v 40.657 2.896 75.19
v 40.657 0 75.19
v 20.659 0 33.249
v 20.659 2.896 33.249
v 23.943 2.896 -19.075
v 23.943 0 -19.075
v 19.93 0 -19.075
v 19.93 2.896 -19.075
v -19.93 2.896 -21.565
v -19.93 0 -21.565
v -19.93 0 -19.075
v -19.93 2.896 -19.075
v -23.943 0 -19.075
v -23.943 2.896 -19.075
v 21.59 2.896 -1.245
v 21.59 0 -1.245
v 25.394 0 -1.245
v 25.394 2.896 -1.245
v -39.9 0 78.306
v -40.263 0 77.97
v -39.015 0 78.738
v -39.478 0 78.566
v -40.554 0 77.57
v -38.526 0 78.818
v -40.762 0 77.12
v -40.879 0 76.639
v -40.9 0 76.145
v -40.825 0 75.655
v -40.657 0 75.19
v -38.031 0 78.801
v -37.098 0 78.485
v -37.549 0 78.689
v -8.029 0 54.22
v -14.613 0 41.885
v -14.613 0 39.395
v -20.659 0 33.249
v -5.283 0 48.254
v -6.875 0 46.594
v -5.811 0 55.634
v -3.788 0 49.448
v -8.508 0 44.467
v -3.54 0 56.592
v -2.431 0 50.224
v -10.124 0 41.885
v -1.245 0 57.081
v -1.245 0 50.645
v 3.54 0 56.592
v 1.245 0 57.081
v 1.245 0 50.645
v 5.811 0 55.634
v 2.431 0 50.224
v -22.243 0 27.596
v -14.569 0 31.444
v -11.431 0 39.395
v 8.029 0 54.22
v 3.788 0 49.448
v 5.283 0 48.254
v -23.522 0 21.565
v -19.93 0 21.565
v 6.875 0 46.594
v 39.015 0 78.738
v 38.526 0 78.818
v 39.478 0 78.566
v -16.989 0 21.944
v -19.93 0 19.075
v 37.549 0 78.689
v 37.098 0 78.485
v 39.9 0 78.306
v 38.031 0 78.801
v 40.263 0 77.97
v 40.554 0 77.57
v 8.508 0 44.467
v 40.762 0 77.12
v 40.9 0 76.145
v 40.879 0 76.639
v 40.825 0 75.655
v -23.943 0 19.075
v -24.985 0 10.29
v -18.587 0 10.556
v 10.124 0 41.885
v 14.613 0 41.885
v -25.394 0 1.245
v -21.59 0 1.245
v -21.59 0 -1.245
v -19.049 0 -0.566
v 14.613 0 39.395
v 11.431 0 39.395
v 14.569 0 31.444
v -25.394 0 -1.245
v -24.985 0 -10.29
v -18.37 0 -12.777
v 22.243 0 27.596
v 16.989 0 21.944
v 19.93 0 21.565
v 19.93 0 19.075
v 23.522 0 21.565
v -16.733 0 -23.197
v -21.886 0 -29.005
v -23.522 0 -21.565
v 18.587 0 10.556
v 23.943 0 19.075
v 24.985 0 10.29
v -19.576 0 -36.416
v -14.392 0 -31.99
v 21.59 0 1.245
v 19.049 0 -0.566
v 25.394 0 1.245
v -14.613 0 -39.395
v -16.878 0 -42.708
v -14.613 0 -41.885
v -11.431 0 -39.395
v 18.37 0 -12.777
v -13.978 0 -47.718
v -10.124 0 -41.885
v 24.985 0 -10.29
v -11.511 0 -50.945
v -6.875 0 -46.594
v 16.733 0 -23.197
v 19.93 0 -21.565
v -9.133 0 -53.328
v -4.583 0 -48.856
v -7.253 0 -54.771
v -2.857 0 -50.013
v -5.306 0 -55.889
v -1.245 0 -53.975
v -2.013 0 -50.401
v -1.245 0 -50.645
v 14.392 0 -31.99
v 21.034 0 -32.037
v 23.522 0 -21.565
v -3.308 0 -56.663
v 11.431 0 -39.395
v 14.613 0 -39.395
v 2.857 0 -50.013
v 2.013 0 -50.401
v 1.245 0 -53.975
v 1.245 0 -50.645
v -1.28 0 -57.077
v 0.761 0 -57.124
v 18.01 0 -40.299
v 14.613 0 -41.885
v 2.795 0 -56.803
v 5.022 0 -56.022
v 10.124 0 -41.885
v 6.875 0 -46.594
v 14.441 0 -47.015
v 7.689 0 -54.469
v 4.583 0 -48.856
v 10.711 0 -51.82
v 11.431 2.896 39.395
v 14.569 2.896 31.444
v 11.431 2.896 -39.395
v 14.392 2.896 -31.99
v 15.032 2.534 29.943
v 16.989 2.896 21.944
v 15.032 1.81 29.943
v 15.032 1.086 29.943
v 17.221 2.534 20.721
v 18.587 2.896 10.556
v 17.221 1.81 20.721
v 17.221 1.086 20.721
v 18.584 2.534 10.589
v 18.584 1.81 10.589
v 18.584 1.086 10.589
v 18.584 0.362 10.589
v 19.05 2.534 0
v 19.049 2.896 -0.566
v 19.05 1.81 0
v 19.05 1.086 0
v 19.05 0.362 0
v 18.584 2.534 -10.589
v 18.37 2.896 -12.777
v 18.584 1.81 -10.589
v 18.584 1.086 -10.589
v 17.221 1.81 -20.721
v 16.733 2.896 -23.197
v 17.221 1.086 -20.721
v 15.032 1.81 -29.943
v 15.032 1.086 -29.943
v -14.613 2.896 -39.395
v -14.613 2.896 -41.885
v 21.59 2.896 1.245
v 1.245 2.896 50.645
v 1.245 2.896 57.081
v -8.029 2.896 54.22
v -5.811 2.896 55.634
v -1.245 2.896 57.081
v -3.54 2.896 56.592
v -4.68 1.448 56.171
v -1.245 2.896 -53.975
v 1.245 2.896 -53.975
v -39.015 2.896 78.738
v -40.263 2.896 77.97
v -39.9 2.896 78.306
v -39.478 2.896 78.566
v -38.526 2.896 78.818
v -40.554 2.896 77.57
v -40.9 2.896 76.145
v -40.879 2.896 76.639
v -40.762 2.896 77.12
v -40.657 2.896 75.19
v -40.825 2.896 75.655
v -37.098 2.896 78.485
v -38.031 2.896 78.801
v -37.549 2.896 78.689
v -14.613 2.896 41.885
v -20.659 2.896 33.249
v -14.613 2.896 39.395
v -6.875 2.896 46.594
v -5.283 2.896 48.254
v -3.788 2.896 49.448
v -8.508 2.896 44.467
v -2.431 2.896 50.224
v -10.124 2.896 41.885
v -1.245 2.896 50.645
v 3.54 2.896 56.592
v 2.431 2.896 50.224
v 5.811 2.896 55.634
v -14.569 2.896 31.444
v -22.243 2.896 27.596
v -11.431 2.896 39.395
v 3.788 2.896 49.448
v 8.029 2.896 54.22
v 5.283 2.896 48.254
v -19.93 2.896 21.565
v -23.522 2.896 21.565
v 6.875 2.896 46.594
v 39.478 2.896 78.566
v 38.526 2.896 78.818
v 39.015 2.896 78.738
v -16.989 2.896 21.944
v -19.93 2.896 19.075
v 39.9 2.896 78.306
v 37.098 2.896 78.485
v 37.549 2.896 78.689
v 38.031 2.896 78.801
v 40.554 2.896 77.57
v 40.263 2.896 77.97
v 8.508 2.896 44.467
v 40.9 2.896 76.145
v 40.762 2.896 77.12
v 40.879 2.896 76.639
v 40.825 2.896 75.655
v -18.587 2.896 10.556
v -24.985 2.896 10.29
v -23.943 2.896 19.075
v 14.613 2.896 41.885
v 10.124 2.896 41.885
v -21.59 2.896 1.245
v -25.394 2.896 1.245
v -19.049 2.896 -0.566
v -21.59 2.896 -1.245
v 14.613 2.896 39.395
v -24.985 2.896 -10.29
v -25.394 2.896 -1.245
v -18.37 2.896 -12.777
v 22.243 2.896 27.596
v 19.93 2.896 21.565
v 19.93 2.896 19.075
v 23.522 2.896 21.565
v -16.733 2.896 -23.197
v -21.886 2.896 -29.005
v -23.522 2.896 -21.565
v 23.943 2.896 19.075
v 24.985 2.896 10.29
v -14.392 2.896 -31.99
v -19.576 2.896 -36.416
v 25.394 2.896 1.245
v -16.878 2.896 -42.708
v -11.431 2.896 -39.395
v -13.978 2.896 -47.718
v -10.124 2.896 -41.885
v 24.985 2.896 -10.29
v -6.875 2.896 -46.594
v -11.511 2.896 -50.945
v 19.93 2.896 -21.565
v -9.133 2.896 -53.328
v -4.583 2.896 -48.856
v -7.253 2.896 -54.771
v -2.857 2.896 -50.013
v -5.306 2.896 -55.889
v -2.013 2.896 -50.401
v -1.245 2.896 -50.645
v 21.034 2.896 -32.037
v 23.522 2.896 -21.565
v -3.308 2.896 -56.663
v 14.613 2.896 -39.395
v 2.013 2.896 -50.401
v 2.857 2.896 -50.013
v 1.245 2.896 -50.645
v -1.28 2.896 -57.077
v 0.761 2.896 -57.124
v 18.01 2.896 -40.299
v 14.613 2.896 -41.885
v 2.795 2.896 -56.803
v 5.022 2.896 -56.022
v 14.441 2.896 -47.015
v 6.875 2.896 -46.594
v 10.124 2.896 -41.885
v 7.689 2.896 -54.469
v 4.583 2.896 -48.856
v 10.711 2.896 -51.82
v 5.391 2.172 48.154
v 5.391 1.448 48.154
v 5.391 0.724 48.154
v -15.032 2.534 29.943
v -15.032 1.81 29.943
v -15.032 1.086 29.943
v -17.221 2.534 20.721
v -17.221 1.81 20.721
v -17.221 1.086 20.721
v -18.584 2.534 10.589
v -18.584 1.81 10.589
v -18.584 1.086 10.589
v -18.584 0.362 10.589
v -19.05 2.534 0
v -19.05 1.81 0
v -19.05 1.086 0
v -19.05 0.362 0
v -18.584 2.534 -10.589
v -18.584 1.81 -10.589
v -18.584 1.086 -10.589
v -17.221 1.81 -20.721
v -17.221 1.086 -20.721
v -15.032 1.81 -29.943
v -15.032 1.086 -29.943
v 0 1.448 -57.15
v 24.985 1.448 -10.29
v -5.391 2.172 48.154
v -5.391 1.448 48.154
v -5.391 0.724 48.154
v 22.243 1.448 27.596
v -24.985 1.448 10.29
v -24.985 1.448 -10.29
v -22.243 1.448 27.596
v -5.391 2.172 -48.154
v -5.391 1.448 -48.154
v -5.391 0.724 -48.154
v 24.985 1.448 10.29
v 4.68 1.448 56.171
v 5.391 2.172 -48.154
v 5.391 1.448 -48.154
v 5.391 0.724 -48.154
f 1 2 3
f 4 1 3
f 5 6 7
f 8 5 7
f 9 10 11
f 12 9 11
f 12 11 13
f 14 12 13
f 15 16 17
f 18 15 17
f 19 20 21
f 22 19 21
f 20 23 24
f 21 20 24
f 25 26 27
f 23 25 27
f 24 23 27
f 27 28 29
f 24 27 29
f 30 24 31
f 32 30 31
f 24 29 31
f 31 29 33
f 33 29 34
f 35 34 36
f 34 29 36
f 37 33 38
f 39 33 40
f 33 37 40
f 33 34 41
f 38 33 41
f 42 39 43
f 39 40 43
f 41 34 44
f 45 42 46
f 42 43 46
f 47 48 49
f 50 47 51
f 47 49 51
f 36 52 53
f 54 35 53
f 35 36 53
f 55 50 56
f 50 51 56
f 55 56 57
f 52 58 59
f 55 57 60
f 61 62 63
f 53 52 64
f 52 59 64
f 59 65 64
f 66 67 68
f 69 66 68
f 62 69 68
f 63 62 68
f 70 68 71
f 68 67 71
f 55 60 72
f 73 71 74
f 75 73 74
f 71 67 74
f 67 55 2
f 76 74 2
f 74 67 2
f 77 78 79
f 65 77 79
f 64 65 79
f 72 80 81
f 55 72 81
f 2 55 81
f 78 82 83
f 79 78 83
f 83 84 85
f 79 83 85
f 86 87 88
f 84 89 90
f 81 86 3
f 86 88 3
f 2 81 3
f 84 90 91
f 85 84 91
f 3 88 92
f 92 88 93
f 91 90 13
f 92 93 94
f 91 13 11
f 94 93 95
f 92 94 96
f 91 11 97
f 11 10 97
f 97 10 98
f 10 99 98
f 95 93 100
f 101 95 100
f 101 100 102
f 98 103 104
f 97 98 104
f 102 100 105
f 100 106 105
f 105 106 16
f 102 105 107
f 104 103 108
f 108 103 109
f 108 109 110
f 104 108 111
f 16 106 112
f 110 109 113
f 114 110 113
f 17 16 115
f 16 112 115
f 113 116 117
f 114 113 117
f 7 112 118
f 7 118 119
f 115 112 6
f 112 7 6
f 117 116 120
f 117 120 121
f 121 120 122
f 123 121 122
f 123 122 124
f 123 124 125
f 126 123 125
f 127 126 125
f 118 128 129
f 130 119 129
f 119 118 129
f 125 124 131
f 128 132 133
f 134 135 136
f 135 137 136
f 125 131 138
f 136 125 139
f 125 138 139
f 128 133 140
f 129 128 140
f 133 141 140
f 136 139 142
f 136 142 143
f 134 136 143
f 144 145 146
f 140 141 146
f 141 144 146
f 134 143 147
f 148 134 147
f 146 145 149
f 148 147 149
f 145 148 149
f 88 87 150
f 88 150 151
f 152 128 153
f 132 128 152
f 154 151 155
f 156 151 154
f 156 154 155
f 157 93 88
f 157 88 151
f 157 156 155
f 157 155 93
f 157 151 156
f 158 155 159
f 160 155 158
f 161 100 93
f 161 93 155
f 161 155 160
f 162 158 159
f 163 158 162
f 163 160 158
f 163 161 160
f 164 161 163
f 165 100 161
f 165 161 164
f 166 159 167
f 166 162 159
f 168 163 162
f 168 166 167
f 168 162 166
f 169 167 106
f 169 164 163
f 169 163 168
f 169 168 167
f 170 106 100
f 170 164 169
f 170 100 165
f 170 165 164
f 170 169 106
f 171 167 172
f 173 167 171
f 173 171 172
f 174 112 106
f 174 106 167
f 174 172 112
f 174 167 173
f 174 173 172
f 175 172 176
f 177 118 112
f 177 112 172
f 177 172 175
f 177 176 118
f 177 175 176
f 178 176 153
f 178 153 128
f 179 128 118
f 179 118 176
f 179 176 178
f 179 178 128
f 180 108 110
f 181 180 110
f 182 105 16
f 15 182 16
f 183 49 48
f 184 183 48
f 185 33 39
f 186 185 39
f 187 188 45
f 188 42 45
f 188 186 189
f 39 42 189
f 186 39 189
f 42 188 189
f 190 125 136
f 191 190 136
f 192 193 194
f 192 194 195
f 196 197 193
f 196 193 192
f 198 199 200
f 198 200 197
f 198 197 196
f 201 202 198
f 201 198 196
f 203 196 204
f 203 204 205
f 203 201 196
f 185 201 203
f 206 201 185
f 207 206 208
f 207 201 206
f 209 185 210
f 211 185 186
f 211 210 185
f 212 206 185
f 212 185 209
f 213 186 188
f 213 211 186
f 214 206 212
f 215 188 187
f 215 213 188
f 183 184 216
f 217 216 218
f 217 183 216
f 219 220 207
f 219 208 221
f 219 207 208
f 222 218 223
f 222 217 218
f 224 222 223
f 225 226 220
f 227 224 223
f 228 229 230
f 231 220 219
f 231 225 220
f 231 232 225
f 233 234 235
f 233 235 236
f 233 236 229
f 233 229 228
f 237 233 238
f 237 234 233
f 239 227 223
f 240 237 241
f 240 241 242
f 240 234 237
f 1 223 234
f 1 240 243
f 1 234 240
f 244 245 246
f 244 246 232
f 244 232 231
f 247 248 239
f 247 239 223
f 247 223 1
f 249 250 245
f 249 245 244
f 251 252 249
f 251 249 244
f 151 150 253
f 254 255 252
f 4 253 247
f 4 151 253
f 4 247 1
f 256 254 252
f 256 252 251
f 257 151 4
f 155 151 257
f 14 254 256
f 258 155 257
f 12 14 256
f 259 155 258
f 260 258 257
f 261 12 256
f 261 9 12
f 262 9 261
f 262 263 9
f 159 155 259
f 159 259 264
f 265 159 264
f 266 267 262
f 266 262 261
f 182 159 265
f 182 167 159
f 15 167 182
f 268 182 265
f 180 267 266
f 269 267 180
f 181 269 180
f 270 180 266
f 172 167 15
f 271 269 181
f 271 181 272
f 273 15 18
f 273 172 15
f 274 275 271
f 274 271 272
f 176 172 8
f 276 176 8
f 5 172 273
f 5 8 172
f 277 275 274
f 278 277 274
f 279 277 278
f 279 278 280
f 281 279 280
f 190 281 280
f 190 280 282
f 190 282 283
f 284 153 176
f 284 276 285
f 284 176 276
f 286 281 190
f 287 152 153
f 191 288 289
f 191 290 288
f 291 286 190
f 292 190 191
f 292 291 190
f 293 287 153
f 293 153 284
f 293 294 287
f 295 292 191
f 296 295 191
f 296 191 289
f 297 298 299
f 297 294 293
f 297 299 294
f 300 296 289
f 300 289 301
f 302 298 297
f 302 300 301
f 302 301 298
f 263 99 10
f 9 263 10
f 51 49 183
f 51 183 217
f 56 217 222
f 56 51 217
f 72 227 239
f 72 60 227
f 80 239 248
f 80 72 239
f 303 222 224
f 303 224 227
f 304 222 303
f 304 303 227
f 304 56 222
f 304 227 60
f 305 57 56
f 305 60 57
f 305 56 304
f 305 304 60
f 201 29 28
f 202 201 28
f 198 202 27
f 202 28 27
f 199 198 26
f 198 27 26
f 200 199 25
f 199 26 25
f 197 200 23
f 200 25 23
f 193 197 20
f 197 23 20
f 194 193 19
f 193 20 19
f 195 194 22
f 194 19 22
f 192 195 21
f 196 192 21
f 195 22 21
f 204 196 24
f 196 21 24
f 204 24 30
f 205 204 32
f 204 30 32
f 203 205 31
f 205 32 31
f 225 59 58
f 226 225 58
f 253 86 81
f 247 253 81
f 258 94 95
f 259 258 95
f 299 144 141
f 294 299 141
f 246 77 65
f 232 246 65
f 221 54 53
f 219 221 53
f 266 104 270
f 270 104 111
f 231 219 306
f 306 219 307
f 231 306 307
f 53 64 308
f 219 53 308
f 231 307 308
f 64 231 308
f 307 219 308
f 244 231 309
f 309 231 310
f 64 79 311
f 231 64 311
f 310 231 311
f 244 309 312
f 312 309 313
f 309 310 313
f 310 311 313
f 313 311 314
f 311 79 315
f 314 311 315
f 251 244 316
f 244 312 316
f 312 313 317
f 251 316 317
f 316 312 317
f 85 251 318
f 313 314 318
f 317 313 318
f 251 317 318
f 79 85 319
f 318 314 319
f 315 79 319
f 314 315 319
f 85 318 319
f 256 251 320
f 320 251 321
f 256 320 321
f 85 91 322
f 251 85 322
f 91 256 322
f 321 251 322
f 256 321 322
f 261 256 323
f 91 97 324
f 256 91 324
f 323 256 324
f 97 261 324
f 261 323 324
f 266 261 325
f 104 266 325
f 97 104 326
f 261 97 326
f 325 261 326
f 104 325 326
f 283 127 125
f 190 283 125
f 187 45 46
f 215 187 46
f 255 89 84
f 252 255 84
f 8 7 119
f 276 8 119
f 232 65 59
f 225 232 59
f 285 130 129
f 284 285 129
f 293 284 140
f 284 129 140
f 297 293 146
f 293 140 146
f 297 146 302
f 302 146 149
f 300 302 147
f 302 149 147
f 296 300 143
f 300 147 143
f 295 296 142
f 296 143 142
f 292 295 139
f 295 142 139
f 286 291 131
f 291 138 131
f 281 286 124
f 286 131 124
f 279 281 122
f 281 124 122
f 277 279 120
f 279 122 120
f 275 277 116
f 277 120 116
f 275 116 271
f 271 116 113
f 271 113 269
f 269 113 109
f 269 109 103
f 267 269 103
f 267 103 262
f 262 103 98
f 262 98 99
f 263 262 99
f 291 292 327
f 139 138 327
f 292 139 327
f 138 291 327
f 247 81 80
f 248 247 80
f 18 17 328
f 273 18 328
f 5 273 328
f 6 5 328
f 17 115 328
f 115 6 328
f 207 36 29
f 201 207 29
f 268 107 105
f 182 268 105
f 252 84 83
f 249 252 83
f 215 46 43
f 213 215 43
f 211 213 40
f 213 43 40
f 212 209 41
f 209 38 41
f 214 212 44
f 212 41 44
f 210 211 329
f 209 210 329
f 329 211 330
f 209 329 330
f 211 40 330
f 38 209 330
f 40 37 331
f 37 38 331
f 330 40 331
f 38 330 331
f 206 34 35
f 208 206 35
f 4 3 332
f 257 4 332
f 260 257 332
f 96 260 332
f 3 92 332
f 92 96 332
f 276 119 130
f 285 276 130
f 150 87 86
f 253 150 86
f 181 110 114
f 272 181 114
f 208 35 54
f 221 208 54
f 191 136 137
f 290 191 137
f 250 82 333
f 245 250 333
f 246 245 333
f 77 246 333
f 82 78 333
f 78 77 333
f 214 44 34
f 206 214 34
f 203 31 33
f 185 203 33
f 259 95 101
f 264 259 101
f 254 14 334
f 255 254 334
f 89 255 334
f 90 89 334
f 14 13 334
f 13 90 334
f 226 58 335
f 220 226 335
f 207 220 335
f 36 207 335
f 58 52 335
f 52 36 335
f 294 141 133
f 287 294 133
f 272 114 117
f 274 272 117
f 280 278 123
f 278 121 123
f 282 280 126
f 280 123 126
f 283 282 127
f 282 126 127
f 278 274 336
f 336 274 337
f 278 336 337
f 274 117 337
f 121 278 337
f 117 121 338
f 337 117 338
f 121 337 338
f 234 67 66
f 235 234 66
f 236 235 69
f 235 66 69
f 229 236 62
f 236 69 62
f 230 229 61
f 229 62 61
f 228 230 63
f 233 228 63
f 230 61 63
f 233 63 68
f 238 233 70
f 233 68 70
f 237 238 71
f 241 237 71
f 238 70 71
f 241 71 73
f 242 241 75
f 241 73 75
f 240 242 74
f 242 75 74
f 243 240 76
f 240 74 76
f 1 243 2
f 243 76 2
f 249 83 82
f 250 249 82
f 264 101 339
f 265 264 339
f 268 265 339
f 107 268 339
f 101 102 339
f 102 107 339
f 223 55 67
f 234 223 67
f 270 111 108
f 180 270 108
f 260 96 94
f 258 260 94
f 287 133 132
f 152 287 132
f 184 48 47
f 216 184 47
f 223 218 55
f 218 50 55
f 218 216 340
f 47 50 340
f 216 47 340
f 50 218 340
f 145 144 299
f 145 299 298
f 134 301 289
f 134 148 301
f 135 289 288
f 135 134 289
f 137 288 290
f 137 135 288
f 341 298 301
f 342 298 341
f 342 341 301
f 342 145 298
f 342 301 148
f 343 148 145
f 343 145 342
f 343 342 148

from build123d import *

# Parameters (mm, degrees)
BOSS_EXTRUDE1_DEPTH = 2.8956


with BuildPart() as part:
    # Sketch1 → Boss-Extrude1 (new body)
    with BuildSketch(Plane(origin=(0, 0, 0), x_dir=(1, 0, 0), z_dir=(0, 1, 0))):
        with BuildLine():
            Line((21.59, 1.2446), (25.393976036, 1.2446))
            add(Edge.make_bspline(
                [(25.393976036, 1.2446), (25.305125525, 10.422131382), (23.943355437, 19.0754)],
                knots=[4.73416848, 4.73416848, 4.73416848, 5.052697334, 5.052697334, 5.052697334], degree=2, weights=[1, 0.987344206, 1]))
            Line((23.943355437, 19.0754), (19.930240776, 19.0754))
            Line((19.930240776, 19.0754), (19.930240776, 21.5646))
            Line((19.930240776, 21.5646), (23.522368768, 21.5646))
            add(Edge.make_bspline(
                [(23.522368768, 21.5646), (0, 151.457597173), (-23.522368768, 21.5646)],
                knots=[5.099304053, 5.099304053, 5.099304053, 7.467066561, 7.467066561, 7.467066561], degree=2, weights=[1, 0.377333333, 1]))
            Line((-23.522368768, 21.5646), (-19.930240776, 21.5646))
            Line((-19.930240776, 21.5646), (-19.930240776, 19.0754))
            Line((-19.930240776, 19.0754), (-23.943355437, 19.0754))
            add(Edge.make_bspline(
                [(-23.943355437, 19.0754), (-25.305125525, 10.422131382), (-25.393976036, 1.2446)],
                knots=[1.230487974, 1.230487974, 1.230487974, 1.549016827, 1.549016827, 1.549016827], degree=2, weights=[1, 0.987344206, 1]))
            Line((-25.393976036, 1.2446), (-21.59, 1.2446))
            Line((-21.59, 1.2446), (-21.59, -1.2446))
            Line((-21.59, -1.2446), (-25.393976036, -1.2446))
            add(Edge.make_bspline(
                [(-25.393976036, -1.2446), (-25.305125525, -10.422131382), (-23.943355437, -19.0754)],
                knots=[1.592575826, 1.592575826, 1.592575826, 1.91110468, 1.91110468, 1.91110468], degree=2, weights=[1, 0.987344206, 1]))
            Line((-23.943355437, -19.0754), (-19.930240776, -19.0754))
            Line((-19.930240776, -19.0754), (-19.930240776, -21.5646))
            Line((-19.930240776, -21.5646), (-23.522368768, -21.5646))
            add(Edge.make_bspline(
                [(-23.522368768, -21.5646), (-22.395811131, -27.785569894), (-20.658836503, -33.249220312)],
                knots=[1.957711399, 1.957711399, 1.957711399, 2.191722412, 2.191722412, 2.191722412], degree=2, weights=[1, 0.993162662, 1]))
            Line((-20.658836503, -33.249220312), (-40.656934115, -75.189915873))
            ThreePointArc((-40.656934115, -75.189915873), (-40.089838211, -78.146952179), (-37.097948163, -78.484969079))
            Line((-37.097948163, -78.484969079), (-8.029094451, -54.219568092))
            add(Edge.make_bspline(
                [(-8.029094451, -54.219568092), (-4.724069079, -56.697277371), (-1.2446, -57.081350193)],
                knots=[2.819970364, 2.819970364, 2.819970364, 3.092573024, 3.092573024, 3.092573024], degree=2, weights=[1, 0.990725346, 1]))
            Line((-1.2446, -57.081350193), (-1.2446, -53.975))
            Line((-1.2446, -53.975), (-1.2446, -50.644928526))
            add(Edge.make_bspline(
                [(-1.2446, -50.644928526), (-1.592566722, -50.559021859), (-2.797472305, -50.153191319), (-5.318112389, -48.514264833), (-8.117471478, -45.20633596), (-9.696301311, -42.637606864), (-10.124198394, -41.884600001)],
                knots=[-3.032554281, -3.032554281, -3.032554281, -3.032554281, -2.945243113, -2.748893572, -2.552544031, -2.478028469, -2.478028469, -2.478028469, -2.478028469], degree=3))
            Line((-10.124198394, -41.884600001), (-14.613224312, -41.884600001))
            Line((-14.613224312, -41.884600001), (-14.613224312, -39.395400001))
            Line((-14.613224312, -39.395400001), (-11.431305901, -39.395400001))
            add(Edge.make_bspline(
                [(-11.431305901, -39.395400001), (-11.677149239, -38.889598832), (-12.987812642, -36.070874709), (-15.148196965, -30.166196648), (-18.099752632, -17.775460251), (-19.683498245, 0), (-18.099752632, 17.775460251), (-15.148196965, 30.166196648), (-12.987812642, 36.070874709), (-11.677149239, 38.889598832), (-11.431305901, 39.395400001)],
                knots=[-2.400745736, -2.400745736, -2.400745736, -2.400745736, -2.35619449, -2.159844949, -1.963495408, -1.570796327, -1.178097245, -0.981747704, -0.785398163, -0.740846918, -0.740846918, -0.740846918, -0.740846918], degree=3))
            Line((-11.431305901, 39.395400001), (-14.613224312, 39.395400001))
            Line((-14.613224312, 39.395400001), (-14.613224312, 41.884600001))
            Line((-14.613224312, 41.884600001), (-10.124198394, 41.884600001))
            add(Edge.make_bspline(
                [(-10.124198394, 41.884600001), (-9.696301311, 42.637606864), (-8.117471478, 45.20633596), (-5.318112389, 48.514264833), (-2.797472305, 50.153191319), (-1.592566722, 50.559021859), (-1.2446, 50.644928526)],
                knots=[-0.663564185, -0.663564185, -0.663564185, -0.663564185, -0.589048623, -0.392699082, -0.196349541, -0.109038372, -0.109038372, -0.109038372, -0.109038372], degree=3))
            Line((-1.2446, 50.644928526), (-1.2446, 53.975))
            Line((-1.2446, 53.975), (1.2446, 53.975))
            Line((1.2446, 53.975), (1.2446, 50.644928526))
            add(Edge.make_bspline(
                [(10.124198394, 41.884600001), (9.696301311, 42.637606864), (8.117471478, 45.20633596), (5.318112389, 48.514264833), (2.797472305, 50.153191319), (1.592566722, 50.559021859), (1.2446, 50.644928526)],
                knots=[-0.663564185, -0.663564185, -0.663564185, -0.663564185, -0.589048623, -0.392699082, -0.196349541, -0.109038372, -0.109038372, -0.109038372, -0.109038372], degree=3))
            Line((10.124198394, 41.884600001), (14.613224312, 41.884600001))
            Line((14.613224312, 41.884600001), (14.613224312, 39.395400001))
            Line((14.613224312, 39.395400001), (11.431305901, 39.395400001))
            add(Edge.make_bspline(
                [(11.431305901, -39.395400001), (11.677149239, -38.889598832), (12.987812642, -36.070874709), (15.148196965, -30.166196648), (18.099752632, -17.775460251), (19.683498245, 0), (18.099752632, 17.775460251), (15.148196965, 30.166196648), (12.987812642, 36.070874709), (11.677149239, 38.889598832), (11.431305901, 39.395400001)],
                knots=[-2.400745736, -2.400745736, -2.400745736, -2.400745736, -2.35619449, -2.159844949, -1.963495408, -1.570796327, -1.178097245, -0.981747704, -0.785398163, -0.740846918, -0.740846918, -0.740846918, -0.740846918], degree=3))
            Line((11.431305901, -39.395400001), (14.613224312, -39.395400001))
            Line((14.613224312, -39.395400001), (14.613224312, -41.884600001))
            Line((14.613224312, -41.884600001), (10.124198394, -41.884600001))
            add(Edge.make_bspline(
                [(1.2446, -50.644928526), (1.592566722, -50.559021859), (2.797472305, -50.153191319), (5.318112389, -48.514264833), (8.117471478, -45.20633596), (9.696301311, -42.637606864), (10.124198394, -41.884600001)],
                knots=[-3.032554281, -3.032554281, -3.032554281, -3.032554281, -2.945243113, -2.748893572, -2.552544031, -2.478028469, -2.478028469, -2.478028469, -2.478028469], degree=3))
            Line((1.2446, -50.644928526), (1.2446, -53.975))
            Line((1.2446, -53.975), (1.2446, -57.081350193))
            add(Edge.make_bspline(
                [(1.2446, -57.081350193), (4.724069079, -56.697277371), (8.029094451, -54.219568092)],
                knots=[3.190612283, 3.190612283, 3.190612283, 3.463214943, 3.463214943, 3.463214943], degree=2, weights=[1, 0.990725346, 1]))
            Line((8.029094451, -54.219568092), (37.097948163, -78.484969079))
            ThreePointArc((37.097948163, -78.484969079), (40.089838211, -78.146952179), (40.656934115, -75.189915873))
            Line((40.656934115, -75.189915873), (20.658836503, -33.249220312))
            add(Edge.make_bspline(
                [(20.658836503, -33.249220312), (22.395811131, -27.785569894), (23.522368768, -21.5646)],
                knots=[4.091462895, 4.091462895, 4.091462895, 4.325473908, 4.325473908, 4.325473908], degree=2, weights=[1, 0.993162662, 1]))
            Line((23.522368768, -21.5646), (19.930240776, -21.5646))
            Line((19.930240776, -21.5646), (19.930240776, -19.0754))
            Line((19.930240776, -19.0754), (23.943355437, -19.0754))
            add(Edge.make_bspline(
                [(23.943355437, -19.0754), (25.305125525, -10.422131382), (25.393976036, -1.2446)],
                knots=[4.372080627, 4.372080627, 4.372080627, 4.690609481, 4.690609481, 4.690609481], degree=2, weights=[1, 0.987344206, 1]))
            Line((25.393976036, -1.2446), (21.59, -1.2446))
            Line((21.59, -1.2446), (21.59, 1.2446))
        make_face()
    extrude(amount=BOSS_EXTRUDE1_DEPTH)


solid = part.part
